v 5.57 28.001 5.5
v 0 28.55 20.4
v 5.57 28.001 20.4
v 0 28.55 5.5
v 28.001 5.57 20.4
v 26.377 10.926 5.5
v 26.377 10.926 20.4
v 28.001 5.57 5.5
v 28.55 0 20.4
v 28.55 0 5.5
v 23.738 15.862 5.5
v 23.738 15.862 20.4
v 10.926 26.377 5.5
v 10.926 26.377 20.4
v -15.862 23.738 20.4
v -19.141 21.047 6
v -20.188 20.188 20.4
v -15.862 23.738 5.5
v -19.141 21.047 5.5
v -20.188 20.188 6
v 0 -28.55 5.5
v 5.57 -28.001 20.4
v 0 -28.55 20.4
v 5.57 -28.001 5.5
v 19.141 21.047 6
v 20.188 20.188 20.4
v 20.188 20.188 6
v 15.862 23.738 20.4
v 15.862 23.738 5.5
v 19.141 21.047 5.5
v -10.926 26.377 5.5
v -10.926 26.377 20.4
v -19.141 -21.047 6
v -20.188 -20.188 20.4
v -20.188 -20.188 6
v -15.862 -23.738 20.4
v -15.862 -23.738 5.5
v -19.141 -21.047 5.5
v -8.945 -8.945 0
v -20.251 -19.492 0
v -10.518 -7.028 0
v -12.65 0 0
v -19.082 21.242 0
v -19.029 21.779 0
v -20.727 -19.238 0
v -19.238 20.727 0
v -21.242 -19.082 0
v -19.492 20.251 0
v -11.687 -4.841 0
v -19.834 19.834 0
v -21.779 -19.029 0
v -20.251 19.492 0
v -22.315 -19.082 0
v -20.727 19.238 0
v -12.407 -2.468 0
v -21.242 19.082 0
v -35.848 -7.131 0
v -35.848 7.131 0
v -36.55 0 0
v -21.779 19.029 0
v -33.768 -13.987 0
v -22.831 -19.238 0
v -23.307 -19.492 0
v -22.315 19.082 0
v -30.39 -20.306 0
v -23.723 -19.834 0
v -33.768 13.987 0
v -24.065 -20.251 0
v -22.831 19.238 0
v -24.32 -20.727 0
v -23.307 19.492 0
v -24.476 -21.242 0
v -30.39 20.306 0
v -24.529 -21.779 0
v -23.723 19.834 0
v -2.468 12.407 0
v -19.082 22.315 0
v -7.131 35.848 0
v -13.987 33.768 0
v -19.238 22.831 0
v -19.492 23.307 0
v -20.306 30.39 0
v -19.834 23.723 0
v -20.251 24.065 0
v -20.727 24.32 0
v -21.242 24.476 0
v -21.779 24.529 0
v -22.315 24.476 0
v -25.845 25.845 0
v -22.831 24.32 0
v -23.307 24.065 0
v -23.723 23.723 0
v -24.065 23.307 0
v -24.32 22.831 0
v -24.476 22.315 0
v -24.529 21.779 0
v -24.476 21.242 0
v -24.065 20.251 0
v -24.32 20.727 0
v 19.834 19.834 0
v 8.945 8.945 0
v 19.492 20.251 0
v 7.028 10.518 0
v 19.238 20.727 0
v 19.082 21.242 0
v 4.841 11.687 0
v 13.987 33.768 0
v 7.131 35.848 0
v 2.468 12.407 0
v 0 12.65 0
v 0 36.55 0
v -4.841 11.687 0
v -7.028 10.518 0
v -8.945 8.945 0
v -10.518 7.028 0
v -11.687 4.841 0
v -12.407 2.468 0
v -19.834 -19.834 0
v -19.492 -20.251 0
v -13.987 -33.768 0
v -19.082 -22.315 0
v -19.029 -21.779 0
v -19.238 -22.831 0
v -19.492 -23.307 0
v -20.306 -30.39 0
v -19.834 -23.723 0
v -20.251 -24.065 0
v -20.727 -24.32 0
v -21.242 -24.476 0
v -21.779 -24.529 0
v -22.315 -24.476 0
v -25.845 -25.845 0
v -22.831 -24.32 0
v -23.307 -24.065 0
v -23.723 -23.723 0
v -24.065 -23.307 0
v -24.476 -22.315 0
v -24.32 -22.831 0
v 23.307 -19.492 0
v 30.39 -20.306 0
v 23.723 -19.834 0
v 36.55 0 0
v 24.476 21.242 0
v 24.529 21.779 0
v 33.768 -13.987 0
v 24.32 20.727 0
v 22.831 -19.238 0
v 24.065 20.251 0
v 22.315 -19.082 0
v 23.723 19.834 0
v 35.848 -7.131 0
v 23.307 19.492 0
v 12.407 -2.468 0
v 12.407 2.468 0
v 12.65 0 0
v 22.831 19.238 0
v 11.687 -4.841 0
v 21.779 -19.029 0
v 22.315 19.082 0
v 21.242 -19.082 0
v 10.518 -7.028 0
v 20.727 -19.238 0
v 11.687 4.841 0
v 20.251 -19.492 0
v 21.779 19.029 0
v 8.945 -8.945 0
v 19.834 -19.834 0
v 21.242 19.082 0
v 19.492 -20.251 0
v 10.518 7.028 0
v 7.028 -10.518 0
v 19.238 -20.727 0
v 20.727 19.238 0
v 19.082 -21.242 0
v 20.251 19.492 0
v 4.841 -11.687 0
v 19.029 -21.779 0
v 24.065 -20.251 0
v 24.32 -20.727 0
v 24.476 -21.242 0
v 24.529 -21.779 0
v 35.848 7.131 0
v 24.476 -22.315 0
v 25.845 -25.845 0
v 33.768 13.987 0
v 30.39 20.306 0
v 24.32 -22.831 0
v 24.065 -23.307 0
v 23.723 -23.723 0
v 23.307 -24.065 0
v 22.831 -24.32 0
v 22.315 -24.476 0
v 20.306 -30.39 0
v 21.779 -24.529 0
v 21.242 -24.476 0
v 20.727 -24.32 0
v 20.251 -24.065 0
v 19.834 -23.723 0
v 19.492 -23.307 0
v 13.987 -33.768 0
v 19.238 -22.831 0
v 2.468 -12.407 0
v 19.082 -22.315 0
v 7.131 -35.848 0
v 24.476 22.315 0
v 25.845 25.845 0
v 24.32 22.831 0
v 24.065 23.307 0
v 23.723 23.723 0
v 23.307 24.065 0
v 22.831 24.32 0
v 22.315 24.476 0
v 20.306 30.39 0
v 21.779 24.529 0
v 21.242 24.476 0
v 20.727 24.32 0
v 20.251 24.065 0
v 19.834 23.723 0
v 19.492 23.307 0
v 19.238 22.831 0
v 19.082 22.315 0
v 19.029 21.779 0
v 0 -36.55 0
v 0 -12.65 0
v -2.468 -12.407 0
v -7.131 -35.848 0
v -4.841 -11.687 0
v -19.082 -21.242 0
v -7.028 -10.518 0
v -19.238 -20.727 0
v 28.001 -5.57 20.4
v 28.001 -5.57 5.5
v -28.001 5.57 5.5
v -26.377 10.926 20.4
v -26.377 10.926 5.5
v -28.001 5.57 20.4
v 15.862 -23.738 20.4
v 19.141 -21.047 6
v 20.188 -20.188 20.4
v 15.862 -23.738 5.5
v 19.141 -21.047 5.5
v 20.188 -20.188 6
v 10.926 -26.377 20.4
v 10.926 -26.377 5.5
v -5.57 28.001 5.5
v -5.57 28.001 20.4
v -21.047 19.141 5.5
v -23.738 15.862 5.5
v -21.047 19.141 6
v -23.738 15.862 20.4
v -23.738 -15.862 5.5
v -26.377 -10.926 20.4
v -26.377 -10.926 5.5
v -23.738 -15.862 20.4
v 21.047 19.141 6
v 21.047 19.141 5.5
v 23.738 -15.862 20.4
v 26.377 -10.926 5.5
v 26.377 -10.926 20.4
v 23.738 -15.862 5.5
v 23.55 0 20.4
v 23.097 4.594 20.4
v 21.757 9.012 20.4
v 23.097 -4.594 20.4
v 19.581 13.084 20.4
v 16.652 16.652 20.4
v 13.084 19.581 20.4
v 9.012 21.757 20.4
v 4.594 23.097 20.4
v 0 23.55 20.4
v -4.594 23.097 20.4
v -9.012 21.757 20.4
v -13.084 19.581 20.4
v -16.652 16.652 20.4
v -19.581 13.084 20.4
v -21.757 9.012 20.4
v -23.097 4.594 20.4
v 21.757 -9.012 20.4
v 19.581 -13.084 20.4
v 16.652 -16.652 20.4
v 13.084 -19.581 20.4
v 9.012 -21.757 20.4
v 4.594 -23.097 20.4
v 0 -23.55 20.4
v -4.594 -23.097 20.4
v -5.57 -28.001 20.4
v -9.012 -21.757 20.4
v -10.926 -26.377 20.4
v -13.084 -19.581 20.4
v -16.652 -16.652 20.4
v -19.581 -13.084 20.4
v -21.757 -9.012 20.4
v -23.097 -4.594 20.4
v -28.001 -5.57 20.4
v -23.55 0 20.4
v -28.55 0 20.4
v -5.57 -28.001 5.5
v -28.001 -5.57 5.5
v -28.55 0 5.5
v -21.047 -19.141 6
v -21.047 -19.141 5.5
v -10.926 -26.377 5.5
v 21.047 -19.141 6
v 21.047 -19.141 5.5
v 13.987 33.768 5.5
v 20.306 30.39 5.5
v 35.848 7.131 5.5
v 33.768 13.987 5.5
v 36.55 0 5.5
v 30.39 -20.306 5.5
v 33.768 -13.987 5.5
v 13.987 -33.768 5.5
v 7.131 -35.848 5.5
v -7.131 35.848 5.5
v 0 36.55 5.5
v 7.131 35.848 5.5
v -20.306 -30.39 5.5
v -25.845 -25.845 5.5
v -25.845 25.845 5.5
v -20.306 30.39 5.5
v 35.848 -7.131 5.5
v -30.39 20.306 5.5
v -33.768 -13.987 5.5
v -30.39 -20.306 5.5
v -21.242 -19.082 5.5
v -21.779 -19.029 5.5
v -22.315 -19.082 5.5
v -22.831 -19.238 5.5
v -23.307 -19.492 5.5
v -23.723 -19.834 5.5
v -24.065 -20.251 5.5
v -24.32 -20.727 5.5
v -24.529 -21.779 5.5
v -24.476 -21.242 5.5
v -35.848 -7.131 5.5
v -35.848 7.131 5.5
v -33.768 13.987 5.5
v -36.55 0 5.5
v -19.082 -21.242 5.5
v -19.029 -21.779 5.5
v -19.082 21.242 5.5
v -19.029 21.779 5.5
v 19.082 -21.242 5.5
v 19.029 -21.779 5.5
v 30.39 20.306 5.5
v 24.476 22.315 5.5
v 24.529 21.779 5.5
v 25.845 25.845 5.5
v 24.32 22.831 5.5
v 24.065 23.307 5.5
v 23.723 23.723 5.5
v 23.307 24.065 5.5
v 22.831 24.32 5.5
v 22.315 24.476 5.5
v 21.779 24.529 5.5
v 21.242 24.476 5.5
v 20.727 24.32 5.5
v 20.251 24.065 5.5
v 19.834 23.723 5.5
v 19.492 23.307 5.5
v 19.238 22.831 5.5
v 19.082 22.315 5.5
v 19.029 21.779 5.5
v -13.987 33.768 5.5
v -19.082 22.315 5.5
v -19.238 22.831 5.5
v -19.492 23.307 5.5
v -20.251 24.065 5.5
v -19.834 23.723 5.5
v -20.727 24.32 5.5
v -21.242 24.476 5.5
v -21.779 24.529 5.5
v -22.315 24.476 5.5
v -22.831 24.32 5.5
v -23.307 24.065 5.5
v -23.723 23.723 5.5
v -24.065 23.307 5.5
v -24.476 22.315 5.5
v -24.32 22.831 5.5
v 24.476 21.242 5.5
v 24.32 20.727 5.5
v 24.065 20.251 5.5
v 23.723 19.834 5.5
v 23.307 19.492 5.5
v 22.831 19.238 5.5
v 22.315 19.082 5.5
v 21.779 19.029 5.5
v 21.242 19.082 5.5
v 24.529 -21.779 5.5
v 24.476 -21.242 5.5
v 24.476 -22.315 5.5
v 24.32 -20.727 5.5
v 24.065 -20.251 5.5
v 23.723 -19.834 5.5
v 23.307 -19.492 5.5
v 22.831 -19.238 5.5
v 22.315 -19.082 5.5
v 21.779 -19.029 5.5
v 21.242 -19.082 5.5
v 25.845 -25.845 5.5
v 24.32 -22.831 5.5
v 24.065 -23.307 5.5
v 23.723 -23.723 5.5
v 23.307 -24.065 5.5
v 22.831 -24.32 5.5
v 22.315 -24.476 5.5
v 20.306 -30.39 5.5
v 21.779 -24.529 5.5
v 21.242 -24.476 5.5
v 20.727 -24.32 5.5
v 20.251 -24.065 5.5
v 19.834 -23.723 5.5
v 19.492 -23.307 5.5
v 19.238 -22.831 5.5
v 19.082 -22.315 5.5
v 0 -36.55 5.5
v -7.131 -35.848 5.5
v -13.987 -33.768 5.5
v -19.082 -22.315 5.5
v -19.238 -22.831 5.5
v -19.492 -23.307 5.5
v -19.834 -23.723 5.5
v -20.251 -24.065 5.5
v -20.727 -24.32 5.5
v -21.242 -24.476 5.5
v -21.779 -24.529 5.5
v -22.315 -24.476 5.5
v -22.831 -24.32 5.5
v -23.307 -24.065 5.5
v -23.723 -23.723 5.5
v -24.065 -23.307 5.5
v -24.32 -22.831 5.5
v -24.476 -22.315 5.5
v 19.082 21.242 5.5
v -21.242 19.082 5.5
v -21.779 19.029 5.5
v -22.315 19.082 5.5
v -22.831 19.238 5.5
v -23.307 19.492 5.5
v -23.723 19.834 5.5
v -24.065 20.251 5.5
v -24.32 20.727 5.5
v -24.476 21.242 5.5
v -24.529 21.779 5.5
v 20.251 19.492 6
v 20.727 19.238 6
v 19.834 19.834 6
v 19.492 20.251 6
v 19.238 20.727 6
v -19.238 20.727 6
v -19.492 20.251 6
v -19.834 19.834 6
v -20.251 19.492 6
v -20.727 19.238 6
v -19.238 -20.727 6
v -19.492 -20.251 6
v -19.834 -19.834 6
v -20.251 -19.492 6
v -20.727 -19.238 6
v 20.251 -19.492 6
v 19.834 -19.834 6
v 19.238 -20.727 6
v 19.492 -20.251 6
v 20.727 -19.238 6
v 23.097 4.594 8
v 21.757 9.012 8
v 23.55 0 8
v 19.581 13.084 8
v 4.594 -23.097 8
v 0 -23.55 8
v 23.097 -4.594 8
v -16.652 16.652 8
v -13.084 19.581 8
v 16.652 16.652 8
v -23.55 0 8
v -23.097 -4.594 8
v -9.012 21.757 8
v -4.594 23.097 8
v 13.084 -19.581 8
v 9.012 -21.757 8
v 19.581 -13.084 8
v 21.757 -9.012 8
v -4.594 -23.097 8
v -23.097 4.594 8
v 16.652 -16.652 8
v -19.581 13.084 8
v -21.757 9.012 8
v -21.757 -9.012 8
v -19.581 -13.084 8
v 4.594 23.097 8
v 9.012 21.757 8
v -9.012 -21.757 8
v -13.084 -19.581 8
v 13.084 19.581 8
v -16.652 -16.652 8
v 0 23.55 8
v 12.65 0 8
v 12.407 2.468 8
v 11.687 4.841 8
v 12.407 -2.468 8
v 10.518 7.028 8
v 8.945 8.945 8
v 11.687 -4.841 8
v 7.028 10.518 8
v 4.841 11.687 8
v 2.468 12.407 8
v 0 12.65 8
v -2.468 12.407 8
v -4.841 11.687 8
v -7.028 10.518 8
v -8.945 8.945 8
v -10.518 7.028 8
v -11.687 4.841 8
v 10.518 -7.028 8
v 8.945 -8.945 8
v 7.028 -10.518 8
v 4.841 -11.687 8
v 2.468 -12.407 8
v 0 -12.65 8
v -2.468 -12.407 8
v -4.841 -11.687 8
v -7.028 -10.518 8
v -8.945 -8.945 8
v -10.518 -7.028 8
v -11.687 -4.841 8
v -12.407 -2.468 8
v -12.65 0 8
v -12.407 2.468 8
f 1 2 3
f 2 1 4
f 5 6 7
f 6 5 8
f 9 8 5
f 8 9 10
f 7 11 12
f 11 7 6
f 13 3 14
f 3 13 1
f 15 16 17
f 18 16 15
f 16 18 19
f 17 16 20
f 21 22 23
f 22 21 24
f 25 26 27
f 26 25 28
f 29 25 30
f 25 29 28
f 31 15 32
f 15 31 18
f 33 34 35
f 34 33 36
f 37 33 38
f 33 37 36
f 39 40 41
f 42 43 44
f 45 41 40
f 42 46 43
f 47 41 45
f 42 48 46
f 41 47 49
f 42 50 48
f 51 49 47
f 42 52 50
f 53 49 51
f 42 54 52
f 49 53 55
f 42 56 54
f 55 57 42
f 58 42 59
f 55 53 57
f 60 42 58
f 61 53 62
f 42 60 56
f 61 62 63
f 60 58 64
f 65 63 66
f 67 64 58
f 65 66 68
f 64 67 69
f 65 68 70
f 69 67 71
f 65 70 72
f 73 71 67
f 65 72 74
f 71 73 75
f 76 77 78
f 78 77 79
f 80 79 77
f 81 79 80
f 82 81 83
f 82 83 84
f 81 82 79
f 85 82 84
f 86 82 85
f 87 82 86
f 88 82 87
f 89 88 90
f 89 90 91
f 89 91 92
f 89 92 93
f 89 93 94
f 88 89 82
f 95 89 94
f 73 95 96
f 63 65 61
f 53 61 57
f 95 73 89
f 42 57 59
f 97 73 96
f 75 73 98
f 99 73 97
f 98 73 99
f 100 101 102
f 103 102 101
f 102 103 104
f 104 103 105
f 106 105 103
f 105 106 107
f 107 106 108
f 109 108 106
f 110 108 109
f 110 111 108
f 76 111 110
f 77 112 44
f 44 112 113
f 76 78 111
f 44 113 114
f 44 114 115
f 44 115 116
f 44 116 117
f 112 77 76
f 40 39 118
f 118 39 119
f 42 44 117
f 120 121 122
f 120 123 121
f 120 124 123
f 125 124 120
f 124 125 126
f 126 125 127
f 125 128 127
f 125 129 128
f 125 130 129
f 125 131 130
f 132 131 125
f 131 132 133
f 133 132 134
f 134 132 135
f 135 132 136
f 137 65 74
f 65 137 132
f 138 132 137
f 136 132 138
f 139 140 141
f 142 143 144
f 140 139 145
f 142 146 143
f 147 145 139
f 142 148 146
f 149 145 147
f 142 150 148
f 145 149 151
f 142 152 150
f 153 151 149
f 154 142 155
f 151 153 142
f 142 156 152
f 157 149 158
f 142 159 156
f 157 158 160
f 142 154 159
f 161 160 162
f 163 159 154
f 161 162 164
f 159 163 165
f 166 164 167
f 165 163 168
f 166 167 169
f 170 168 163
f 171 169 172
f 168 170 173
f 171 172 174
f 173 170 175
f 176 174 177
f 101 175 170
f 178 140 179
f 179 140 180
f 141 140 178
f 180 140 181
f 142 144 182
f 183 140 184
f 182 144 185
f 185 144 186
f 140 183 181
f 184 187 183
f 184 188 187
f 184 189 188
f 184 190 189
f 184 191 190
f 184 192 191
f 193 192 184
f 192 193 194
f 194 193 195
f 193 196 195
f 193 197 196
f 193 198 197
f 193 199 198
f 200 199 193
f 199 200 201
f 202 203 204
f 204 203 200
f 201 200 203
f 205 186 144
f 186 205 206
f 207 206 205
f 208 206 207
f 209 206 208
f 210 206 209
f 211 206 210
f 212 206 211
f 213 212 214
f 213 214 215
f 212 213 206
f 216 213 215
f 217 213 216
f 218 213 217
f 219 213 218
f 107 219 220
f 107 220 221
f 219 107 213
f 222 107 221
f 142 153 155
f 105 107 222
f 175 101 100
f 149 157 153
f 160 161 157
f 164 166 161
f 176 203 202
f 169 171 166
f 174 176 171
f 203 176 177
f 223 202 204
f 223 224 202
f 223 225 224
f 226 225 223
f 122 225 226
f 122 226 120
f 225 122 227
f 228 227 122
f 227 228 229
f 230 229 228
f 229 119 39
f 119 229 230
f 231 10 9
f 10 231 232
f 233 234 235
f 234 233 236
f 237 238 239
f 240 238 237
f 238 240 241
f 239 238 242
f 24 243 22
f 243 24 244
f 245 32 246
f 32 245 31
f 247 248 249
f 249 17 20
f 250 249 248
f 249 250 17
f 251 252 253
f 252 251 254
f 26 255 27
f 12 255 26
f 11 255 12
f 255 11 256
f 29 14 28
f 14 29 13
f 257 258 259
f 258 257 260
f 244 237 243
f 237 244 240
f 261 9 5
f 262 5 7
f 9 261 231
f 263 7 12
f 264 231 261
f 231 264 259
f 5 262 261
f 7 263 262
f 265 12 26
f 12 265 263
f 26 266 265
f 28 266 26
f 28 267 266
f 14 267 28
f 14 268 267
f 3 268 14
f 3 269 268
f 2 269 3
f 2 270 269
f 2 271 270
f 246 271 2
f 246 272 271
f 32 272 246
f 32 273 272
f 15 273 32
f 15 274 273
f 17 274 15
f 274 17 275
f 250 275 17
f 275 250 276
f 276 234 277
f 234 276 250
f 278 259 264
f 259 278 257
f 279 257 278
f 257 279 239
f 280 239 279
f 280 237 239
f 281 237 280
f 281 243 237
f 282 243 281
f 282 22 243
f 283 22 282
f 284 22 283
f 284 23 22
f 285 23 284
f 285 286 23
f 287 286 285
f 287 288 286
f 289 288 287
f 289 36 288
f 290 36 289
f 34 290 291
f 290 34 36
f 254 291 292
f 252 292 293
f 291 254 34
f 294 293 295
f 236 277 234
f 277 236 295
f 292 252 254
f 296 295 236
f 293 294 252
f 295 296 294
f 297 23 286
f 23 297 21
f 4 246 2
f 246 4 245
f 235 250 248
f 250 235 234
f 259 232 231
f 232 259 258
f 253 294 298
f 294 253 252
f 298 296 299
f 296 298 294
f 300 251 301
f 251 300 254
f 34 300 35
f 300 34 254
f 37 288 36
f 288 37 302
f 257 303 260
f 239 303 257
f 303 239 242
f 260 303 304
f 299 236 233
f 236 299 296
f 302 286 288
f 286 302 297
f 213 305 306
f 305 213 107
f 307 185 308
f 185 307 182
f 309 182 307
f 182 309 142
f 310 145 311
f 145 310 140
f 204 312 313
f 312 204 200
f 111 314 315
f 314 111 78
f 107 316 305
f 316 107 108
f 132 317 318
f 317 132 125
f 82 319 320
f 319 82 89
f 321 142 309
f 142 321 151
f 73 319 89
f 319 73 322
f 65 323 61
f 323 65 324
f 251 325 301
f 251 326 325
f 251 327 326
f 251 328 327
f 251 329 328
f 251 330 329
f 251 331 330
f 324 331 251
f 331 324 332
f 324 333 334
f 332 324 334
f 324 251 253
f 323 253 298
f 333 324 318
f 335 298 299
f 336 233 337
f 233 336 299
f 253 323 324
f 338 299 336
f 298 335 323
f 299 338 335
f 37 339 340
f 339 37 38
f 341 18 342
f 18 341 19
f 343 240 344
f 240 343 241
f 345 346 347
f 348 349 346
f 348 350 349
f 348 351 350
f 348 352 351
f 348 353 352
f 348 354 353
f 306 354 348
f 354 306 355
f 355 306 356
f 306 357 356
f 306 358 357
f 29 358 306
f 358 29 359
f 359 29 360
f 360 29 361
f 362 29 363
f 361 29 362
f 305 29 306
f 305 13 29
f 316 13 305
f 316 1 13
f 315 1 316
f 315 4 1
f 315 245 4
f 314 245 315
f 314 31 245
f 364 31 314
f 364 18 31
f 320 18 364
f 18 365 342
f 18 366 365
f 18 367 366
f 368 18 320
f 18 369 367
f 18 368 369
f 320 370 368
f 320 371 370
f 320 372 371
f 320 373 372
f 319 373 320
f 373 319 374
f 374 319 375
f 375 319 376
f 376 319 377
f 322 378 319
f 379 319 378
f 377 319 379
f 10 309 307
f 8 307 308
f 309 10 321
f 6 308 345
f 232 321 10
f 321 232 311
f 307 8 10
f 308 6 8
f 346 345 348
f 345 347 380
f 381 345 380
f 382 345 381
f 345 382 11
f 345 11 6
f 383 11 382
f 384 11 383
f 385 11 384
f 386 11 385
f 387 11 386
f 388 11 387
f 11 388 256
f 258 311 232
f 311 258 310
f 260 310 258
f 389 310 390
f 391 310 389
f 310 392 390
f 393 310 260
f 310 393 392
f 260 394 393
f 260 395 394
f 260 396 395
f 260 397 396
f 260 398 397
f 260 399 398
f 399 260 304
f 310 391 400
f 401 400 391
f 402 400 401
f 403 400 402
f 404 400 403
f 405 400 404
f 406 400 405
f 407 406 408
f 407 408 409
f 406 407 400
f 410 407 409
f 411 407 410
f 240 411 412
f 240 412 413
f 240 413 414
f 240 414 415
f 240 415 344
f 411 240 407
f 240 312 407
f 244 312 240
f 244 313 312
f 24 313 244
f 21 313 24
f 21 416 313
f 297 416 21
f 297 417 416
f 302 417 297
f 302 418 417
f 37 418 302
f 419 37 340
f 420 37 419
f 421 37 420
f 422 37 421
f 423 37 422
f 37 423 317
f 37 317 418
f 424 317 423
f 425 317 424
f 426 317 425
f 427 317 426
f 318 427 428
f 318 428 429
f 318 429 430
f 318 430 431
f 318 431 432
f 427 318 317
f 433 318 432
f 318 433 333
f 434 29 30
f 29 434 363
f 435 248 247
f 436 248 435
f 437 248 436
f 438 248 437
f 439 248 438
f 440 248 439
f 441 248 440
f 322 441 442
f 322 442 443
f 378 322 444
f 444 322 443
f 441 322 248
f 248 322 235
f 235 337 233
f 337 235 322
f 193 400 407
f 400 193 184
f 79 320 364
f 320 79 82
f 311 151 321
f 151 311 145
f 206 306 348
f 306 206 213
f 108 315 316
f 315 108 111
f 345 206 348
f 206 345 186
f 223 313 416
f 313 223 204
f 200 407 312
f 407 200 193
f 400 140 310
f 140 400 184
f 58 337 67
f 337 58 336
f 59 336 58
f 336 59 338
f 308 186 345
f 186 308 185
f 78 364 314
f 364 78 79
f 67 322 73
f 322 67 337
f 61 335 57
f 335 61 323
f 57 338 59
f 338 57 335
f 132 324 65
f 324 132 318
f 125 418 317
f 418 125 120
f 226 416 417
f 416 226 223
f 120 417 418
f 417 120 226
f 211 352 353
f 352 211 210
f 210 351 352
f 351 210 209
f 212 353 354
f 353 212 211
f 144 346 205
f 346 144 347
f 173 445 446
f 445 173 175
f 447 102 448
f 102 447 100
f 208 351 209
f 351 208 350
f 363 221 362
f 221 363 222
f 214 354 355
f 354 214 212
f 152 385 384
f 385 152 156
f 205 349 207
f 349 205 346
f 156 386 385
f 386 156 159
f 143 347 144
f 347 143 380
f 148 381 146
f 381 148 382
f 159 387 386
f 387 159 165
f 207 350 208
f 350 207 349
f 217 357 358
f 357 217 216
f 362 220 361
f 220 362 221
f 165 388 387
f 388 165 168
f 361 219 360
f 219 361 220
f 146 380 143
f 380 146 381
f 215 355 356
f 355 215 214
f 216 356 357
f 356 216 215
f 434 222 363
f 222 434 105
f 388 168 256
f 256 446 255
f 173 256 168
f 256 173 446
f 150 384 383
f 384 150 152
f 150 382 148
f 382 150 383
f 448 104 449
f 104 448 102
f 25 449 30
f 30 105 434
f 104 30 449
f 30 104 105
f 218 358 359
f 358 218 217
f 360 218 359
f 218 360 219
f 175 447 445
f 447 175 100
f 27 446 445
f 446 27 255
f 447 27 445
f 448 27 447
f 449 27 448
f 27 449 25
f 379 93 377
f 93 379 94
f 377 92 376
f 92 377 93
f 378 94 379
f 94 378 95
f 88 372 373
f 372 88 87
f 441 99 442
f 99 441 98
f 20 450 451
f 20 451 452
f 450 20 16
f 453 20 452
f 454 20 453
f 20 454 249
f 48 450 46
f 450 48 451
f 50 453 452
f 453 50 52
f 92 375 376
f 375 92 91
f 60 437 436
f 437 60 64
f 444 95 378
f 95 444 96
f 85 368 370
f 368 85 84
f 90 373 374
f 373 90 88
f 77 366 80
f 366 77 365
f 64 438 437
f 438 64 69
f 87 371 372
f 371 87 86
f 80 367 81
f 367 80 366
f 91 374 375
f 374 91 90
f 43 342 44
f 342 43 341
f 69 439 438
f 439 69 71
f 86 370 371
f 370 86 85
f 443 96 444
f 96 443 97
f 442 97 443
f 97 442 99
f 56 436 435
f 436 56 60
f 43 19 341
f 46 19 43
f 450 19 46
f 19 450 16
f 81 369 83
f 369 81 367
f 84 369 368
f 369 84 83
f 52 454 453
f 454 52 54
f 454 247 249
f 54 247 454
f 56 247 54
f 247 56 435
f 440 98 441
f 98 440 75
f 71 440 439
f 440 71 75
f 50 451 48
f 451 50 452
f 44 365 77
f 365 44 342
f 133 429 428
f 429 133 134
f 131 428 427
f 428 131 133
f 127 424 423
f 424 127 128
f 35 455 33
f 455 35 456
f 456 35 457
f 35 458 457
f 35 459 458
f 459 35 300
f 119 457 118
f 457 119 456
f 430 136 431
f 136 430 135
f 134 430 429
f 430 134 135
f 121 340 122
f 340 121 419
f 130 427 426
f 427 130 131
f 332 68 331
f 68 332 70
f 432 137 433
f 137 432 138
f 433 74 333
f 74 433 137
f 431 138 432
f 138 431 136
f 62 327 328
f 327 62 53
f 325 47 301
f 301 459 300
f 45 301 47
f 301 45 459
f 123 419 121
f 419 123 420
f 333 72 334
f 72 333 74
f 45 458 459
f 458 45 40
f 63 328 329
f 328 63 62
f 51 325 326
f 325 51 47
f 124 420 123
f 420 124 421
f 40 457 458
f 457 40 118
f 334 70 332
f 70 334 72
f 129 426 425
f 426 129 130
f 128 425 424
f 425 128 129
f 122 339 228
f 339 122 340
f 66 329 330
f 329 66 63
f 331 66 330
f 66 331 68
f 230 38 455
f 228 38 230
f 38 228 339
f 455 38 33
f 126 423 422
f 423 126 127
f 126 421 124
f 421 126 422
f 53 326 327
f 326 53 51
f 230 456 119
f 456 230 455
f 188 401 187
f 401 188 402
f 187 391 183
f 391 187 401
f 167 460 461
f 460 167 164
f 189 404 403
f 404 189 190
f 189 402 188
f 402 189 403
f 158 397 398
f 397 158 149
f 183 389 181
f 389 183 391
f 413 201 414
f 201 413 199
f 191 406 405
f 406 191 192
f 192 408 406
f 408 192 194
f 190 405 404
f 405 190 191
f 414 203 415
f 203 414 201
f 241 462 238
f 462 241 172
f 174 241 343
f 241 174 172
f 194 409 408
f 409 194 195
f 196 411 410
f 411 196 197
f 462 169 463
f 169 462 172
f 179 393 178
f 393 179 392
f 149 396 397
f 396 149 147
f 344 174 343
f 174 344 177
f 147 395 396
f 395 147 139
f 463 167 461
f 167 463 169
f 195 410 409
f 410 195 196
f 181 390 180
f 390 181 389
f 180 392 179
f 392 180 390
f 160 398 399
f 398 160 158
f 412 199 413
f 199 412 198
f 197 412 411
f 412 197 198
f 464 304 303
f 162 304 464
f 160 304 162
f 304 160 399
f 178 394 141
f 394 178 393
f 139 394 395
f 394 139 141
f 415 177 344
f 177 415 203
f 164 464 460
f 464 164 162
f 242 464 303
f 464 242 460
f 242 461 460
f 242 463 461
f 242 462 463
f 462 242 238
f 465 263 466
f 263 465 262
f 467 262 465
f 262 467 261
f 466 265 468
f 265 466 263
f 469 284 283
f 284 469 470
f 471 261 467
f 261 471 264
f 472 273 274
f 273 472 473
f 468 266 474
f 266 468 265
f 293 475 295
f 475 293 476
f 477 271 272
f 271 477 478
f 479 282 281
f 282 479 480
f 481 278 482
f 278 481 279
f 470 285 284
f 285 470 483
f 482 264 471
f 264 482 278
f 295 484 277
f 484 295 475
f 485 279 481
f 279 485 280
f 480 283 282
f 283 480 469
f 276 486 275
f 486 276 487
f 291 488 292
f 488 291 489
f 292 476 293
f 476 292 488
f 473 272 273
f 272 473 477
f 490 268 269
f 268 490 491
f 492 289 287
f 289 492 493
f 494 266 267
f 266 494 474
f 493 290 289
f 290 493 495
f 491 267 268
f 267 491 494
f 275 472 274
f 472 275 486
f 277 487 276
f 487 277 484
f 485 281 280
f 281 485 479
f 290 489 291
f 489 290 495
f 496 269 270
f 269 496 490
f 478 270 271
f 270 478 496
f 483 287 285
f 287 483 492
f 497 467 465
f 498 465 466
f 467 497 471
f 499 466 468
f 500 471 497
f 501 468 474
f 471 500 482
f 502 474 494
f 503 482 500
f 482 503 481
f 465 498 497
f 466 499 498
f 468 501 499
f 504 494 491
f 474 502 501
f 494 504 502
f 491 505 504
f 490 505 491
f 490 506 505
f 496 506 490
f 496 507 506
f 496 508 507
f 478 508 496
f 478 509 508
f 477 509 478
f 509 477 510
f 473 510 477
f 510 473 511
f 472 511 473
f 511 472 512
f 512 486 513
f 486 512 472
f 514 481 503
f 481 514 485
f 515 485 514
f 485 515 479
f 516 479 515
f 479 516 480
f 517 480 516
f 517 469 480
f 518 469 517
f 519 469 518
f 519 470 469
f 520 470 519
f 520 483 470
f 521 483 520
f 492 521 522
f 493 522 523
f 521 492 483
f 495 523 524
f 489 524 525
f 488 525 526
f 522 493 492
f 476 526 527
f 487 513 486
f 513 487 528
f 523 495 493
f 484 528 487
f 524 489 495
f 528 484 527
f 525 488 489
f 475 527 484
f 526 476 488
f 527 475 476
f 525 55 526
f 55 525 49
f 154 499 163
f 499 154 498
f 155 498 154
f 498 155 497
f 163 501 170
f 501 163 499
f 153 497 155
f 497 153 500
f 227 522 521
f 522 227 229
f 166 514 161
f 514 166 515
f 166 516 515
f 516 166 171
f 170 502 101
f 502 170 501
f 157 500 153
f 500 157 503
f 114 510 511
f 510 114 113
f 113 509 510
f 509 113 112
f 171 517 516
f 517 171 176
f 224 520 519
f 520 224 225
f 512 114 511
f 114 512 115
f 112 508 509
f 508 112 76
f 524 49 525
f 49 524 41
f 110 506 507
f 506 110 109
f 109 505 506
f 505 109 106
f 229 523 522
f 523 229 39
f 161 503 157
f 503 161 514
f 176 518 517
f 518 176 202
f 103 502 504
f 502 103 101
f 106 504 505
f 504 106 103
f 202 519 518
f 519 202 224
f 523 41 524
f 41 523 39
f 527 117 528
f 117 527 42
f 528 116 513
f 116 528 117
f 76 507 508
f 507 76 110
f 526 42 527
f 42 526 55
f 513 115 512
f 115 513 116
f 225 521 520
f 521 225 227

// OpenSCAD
$fn = 32;

// ----------------------------------------------------------------------
// Bearing housing: seat for 6005 (47 x 12 mm), 57.1 mm body
// ----------------------------------------------------------------------

// --- parameters (mm) ---
body_od = 57.1;           // housing outside diameter
body_h = 20.4;            // overall housing height
wall = 5;                 // wall thickness
pocket_d = 47.1;          // 6005 seat, 0.1 mm clearance
seat_h = 12.4;            // pocket depth
shoulder = 4;             // shoulder under the bearing
pass_d = 25.3;            // shaft passage
flange_dia = 73.1;        // mounting flange diameter
flange_t = 4;             // flange thickness
bolt_d = 5.5;             // flange bolt clearance
bolt_r = 30.8;            // flange bolt circle radius

module body() {
  cylinder(h = body_h, d = body_od);
}

module flange() {
  /* flange sunk 1.5 mm into the body */
  cylinder(h = flange_t + 1.5, d = flange_dia);
}

difference() {
  union() {
    body();
    flange();
  }
  translate([0, 0, body_h - seat_h]) cylinder(h = seat_h + 1, d = pocket_d);
  translate([0, 0, -1]) cylinder(h = body_h - seat_h + 1, d = pass_d);
  for (i = [0 : 3]) rotate([0, 0, 45 + i * 90]) translate([bolt_r, 0, -1])
    cylinder(h = flange_t + 3, d = bolt_d);
}
